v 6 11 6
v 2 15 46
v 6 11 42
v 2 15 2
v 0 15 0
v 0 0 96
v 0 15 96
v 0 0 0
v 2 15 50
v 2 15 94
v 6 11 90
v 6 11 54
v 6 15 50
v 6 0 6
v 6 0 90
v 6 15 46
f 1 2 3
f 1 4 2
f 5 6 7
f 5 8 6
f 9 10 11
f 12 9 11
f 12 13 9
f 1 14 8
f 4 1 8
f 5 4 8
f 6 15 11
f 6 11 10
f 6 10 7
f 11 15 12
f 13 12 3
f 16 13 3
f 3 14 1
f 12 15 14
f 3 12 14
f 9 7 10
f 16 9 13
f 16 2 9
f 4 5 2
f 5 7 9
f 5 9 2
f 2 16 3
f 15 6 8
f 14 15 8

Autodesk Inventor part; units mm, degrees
ref_plane "YZ Plane" through (0, 0, 0) normal (1, 0, 0) x (0, 1, 0)
ref_plane "XZ Plane" through (0, 0, 0) normal (0, 1, 0) x (-1, 0, 0)
ref_plane "XY Plane" through (0, 0, 0) normal (0, 0, 1) x (1, 0, 0)
sketch "Sketch1" plane through (0, 0, 0) normal (0, 0, 1) x (1, 0, 0)
  line L0 (0, 0) -> (6, 0)
  line L1 (6, 0) -> (6, 11)
  line L2 (0, 0) -> (0, 15)
  line L3 (0, 15) -> (2, 15)
  line L4 (2, 15) -> (6, 11)
  dimension "d0" = 6
  dimension "d1" = 11
  dimension "d2" = 15
  dimension "d3" = 2
extrude "Extrusion1" add sketch "Sketch1" along normal blind 96
sketch "Sketch2" plane through (0, 0, 0) normal (0, -1, 0) x (1, 0, 0)
  line L0 (0, 0) -> (0, 96) projected
  line L1 (5.9866, 0) -> (0, 0)
  line L2 (0, 96) -> (6, 96) projected
  line L3 (0, 96) -> (6, 96)
  line L4 (6, 96) -> (6, 90)
  line L5 (6, 90) -> (0, 96)
  line L6 (0, 0) -> (6, 0) projected
  line L7 (6, 0) -> (0, 0)
  line L8 (6, 0) -> (6, 6)
  line L9 (6, 0) -> (6, 96) projected
  line L10 (6, 6) -> (0, 0)
  dimension "d7" = 6
  dimension "d8" = 6
extrude "Extrusion2" cut sketch "Sketch2" against normal blind 42.1125 contours L10 L8 L6 L1 | L2 L4 L5
sketch "Sketch3" plane through (6, 0, 90) normal (1, 0, 0) x (0, 0, -1)
  line L0 (84, 11) -> (0, 11) projected
  line L1 (84, 0) -> (0, 0) projected
  line L2 (42, 11) -> (42, 0)
  line L3 (42, 0) -> (48, 0)
  line L4 (90, 0) -> (-6, 0) projected
  line L5 (48, 0) -> (48, 11)
  line L6 (42, 0) -> (36, 0)
  line L7 (36, 0) -> (36, 11)
  line L8 (42, 11) -> (42, 15)
  line L9 (88, 15) -> (-4, 15) projected
  line L10 (42, 15) -> (44, 15)
  line L11 (44, 15) -> (48, 11)
  line L12 (42, 15) -> (40, 15)
  line L13 (40, 15) -> (36, 11)
  point P0 (36, 0)
  dimension "d11" = 6
  dimension "d12" = 6
  dimension "d13" = 2
  dimension "d14" = 2
extrude "Extrusion3" add sketch "Sketch3" against normal blind 6
properties part number "edge-join-no-hole"
